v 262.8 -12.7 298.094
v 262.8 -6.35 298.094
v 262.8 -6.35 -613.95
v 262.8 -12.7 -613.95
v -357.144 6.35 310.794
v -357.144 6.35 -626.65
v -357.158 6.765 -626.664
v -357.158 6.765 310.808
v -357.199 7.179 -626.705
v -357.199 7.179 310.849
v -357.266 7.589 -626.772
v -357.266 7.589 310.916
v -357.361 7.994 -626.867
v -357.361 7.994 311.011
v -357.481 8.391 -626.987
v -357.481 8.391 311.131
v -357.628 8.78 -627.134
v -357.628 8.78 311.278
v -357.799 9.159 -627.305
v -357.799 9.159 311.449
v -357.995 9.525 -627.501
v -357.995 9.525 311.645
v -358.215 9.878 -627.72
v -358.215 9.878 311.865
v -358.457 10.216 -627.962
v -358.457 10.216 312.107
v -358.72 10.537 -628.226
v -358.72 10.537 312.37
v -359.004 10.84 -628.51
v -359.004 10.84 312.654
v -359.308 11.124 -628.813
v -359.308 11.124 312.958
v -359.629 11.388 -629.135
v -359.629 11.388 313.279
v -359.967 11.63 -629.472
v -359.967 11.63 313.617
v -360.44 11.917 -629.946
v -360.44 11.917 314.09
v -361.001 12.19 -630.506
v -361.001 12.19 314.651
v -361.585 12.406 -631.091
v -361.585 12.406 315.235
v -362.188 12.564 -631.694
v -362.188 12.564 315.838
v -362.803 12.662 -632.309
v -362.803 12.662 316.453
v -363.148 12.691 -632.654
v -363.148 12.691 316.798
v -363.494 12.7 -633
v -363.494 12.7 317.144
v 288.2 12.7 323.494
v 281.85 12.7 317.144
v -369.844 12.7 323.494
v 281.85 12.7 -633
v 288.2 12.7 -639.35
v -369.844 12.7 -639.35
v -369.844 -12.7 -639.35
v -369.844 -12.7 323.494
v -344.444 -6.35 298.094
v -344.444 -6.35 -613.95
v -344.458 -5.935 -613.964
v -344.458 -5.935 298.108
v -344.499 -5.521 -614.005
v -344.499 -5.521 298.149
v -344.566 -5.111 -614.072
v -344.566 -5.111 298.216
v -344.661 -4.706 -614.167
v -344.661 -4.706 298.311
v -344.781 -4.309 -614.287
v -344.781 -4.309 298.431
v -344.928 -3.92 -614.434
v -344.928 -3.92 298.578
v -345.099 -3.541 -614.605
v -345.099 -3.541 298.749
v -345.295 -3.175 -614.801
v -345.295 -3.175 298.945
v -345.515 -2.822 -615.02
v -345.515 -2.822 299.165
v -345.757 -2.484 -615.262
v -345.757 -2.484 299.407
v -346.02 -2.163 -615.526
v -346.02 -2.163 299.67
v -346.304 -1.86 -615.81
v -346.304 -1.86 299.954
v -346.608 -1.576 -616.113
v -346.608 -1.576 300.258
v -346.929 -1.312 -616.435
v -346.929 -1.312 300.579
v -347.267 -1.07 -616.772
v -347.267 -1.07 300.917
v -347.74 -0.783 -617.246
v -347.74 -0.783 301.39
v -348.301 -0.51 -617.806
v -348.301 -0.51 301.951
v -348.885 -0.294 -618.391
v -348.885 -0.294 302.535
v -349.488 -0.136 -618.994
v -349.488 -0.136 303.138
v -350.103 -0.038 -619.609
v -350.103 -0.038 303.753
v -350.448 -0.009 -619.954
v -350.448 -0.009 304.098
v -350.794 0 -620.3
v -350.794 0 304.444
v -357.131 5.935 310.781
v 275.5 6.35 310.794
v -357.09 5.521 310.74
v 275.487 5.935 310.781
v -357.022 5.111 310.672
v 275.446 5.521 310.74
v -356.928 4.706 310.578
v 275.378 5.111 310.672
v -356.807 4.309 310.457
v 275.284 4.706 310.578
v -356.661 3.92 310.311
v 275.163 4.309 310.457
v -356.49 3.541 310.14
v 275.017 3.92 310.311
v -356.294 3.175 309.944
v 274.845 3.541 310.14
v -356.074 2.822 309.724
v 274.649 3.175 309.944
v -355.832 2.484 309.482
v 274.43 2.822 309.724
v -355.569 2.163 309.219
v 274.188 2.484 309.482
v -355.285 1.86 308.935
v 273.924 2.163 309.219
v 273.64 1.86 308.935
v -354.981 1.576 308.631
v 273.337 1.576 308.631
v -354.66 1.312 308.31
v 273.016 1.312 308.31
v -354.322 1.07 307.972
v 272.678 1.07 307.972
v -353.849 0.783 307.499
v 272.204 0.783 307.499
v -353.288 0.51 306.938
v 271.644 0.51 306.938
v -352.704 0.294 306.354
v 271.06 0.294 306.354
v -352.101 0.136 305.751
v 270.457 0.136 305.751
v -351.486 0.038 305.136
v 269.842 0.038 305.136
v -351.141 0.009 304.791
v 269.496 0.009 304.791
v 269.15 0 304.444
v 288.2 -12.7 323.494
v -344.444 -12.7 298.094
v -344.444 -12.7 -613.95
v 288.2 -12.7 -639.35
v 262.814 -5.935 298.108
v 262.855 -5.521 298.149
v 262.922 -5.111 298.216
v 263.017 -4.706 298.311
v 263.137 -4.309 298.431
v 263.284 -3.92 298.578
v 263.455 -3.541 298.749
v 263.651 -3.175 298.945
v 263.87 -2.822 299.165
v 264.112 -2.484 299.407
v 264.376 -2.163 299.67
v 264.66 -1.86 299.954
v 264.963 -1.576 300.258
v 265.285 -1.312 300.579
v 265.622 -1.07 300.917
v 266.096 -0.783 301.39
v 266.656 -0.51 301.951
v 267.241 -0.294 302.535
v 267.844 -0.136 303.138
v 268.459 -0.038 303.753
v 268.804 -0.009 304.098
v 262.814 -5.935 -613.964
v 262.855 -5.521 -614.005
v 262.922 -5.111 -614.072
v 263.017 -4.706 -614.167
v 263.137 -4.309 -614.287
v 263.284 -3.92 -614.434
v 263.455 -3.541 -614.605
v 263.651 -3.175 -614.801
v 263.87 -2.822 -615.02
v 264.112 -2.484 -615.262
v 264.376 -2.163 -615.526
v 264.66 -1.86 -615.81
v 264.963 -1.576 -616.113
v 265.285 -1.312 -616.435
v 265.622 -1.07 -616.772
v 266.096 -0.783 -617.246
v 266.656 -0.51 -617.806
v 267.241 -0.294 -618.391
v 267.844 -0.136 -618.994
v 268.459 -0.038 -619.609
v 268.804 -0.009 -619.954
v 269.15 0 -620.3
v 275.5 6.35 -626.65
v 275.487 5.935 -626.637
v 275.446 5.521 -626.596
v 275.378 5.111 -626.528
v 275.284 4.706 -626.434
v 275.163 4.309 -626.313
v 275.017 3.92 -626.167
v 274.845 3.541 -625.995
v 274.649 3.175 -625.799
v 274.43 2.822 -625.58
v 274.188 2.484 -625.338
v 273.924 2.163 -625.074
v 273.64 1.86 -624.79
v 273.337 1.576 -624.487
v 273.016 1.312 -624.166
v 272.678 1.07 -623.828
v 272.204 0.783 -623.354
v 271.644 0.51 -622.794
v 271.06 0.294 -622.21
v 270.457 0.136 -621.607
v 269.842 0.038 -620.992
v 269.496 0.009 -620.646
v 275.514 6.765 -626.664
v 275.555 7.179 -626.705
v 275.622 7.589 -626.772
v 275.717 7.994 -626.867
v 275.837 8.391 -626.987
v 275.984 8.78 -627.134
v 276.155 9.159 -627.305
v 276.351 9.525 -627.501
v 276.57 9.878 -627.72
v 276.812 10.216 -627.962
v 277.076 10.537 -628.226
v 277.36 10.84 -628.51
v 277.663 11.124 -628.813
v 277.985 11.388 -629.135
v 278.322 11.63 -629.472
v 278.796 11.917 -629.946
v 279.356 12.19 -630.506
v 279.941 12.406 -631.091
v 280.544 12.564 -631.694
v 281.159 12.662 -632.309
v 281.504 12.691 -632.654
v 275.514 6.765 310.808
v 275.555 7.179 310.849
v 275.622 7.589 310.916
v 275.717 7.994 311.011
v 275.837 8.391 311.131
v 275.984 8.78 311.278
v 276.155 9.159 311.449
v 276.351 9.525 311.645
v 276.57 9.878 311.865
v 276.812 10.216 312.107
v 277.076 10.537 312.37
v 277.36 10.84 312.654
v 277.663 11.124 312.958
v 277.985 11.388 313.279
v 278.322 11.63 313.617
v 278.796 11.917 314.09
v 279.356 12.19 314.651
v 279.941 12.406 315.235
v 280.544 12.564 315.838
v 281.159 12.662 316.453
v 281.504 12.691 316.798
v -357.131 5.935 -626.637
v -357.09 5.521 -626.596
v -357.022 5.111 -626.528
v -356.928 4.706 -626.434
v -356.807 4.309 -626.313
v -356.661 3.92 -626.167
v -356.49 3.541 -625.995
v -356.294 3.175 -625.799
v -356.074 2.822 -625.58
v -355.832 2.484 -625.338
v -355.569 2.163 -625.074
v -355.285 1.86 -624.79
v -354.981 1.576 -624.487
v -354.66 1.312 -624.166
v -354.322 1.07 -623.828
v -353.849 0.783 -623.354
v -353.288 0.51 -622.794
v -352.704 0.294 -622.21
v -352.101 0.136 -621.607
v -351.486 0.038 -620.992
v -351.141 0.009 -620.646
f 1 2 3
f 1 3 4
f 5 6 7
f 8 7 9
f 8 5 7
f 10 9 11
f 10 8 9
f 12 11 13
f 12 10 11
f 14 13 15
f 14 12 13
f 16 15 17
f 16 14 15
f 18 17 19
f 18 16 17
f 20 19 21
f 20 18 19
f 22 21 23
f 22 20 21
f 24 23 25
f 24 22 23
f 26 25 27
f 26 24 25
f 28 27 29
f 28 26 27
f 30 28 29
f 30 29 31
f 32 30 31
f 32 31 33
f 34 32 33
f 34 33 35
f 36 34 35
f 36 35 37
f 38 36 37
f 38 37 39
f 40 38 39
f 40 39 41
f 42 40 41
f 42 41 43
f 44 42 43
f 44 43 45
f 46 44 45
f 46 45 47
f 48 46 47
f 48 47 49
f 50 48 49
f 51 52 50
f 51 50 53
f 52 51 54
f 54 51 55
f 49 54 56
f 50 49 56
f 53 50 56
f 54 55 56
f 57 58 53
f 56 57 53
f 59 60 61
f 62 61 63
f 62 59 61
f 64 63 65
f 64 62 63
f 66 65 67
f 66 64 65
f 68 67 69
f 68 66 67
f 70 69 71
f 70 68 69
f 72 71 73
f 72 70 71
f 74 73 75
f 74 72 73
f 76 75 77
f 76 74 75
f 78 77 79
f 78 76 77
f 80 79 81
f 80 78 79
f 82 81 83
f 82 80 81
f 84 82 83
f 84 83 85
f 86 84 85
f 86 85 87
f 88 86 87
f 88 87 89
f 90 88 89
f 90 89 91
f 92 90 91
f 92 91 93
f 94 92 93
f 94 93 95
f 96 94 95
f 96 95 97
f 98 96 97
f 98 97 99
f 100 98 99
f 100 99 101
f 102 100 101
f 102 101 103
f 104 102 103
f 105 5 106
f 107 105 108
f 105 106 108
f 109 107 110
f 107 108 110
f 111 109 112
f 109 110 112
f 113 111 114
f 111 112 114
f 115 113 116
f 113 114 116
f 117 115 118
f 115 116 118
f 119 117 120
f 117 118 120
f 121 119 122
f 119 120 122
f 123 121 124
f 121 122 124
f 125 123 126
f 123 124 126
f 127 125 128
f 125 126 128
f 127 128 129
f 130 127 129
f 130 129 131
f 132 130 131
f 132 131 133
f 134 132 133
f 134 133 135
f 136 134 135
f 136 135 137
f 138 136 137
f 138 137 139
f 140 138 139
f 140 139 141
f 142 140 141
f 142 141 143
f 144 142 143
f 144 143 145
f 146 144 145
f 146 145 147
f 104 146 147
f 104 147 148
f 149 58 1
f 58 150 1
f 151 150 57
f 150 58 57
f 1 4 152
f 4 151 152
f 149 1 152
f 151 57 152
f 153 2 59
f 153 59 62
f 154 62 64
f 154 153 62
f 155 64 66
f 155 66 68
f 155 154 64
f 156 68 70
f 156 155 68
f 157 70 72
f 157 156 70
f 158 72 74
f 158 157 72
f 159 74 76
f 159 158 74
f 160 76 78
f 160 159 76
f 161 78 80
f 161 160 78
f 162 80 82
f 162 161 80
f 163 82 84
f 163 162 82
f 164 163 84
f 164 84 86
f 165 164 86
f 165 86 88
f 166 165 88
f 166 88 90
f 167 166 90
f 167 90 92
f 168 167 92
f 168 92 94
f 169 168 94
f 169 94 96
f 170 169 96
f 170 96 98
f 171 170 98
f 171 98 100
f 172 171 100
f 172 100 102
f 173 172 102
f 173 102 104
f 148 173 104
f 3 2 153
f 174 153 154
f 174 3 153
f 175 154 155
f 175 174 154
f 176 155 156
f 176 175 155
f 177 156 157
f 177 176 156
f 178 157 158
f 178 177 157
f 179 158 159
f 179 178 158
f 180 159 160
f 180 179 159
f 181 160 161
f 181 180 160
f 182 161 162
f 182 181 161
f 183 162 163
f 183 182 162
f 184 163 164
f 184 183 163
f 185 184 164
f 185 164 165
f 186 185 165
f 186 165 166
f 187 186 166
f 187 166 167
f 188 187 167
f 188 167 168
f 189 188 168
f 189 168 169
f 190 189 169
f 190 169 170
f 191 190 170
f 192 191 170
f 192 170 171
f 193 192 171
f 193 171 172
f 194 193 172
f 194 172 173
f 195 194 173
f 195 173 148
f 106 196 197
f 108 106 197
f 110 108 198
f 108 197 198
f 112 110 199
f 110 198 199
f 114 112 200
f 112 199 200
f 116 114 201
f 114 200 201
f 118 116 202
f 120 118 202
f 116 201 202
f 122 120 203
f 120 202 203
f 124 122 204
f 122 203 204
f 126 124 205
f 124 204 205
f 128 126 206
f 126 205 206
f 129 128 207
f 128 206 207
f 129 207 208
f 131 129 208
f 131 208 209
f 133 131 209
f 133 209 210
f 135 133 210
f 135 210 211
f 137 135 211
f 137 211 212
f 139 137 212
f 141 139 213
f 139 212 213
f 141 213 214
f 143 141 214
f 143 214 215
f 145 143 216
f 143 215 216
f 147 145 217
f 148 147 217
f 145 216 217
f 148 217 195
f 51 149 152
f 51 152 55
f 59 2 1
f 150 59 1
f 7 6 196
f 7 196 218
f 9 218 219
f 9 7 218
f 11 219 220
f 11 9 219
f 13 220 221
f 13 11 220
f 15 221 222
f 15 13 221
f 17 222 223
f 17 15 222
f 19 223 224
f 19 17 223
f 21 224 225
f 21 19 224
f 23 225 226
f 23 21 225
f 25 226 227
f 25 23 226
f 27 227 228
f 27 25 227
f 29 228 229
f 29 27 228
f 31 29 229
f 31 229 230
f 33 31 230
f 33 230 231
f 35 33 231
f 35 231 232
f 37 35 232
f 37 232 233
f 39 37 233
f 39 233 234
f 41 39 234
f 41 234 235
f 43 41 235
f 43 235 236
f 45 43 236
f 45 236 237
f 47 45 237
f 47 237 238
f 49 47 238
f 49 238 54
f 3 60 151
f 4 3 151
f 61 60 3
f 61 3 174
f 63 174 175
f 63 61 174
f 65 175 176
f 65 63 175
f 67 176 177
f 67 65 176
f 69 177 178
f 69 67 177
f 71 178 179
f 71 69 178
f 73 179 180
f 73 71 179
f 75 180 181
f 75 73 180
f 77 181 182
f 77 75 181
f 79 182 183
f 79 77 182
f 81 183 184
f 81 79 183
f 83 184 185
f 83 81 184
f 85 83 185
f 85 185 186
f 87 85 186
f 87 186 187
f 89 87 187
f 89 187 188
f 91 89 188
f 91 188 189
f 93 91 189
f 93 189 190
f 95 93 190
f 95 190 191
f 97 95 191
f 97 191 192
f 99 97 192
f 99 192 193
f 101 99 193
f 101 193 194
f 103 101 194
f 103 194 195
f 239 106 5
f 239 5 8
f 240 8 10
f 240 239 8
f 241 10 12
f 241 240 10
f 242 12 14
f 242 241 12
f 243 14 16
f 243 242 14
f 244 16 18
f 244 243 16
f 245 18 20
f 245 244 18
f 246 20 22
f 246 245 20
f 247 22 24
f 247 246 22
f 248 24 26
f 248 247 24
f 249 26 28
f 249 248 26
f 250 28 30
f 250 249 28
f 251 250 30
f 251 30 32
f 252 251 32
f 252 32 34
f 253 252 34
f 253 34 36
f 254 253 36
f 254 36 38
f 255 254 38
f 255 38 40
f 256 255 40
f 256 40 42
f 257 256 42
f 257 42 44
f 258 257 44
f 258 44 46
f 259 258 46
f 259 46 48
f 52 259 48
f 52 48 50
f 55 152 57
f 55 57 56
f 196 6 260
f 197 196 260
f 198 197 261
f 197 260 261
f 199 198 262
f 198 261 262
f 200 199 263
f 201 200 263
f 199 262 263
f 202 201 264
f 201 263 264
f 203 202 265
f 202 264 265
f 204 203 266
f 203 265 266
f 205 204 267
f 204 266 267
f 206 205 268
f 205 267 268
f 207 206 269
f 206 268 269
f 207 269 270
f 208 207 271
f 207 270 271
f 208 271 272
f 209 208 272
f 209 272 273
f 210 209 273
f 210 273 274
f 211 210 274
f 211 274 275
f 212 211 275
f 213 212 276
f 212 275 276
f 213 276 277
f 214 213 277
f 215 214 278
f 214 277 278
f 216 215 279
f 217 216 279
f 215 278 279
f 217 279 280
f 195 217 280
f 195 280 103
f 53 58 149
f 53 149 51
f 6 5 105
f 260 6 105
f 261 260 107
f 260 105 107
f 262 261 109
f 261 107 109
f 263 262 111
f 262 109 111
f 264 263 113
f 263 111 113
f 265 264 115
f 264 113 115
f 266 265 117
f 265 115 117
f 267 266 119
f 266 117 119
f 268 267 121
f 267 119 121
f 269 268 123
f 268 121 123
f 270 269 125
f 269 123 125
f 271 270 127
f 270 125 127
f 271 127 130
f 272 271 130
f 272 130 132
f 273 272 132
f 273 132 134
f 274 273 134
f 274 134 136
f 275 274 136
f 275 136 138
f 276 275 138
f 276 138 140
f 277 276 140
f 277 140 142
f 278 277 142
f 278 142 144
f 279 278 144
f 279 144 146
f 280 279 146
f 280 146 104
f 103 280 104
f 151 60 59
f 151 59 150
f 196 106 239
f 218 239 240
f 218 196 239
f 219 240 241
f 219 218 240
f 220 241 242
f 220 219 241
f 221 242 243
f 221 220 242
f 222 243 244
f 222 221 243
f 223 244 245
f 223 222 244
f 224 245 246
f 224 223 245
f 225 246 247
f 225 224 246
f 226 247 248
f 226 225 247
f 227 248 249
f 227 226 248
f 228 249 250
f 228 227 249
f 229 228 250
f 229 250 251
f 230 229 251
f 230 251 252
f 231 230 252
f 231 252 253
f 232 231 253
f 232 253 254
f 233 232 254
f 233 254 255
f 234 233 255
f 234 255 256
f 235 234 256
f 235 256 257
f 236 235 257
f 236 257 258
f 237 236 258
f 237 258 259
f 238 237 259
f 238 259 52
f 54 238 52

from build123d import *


with BuildPart() as f2:
    # F2: sweep along a path in F0
    with BuildLine(Plane.XZ) as f2_path:
        Line((263.9778585136, 299.2721299103), (263.9778585136, -615.1278700897))
        Line((263.9778585136, -615.1278700897), (-345.6221414864, -615.1278700897))
        Line((-345.6221414864, -615.1278700897), (-345.6221414864, 299.2721299103))
        Line((-345.6221414864, 299.2721299103), (263.9778585136, 299.2721299103))
    # F1 (on Top) → F2 (sweep)
    with BuildSketch(Plane.XY):
        with BuildLine():
            Line((288.2001969657, -12.7), (288.2001969657, 12.7))
            Line((288.2001969657, 12.7), (281.8501969657, 12.7))
            ThreePointArc((281.8501969657, 12.7), (277.3600689052, 10.8401280605), (275.5001969657, 6.35))
            ThreePointArc((275.5001969657, 6.35), (273.6403250262, 1.8598719395), (269.1501969657, 0))
            ThreePointArc((269.1501969657, 0), (264.6600689052, -1.8598719395), (262.8001969657, -6.35))
            Line((262.8001969657, -6.35), (262.8001969657, -12.7))
            Line((262.8001969657, -12.7), (288.2001969657, -12.7))
        make_face()
    sweep(path=f2_path.line, transition=Transition.RIGHT)


solid = f2.part
